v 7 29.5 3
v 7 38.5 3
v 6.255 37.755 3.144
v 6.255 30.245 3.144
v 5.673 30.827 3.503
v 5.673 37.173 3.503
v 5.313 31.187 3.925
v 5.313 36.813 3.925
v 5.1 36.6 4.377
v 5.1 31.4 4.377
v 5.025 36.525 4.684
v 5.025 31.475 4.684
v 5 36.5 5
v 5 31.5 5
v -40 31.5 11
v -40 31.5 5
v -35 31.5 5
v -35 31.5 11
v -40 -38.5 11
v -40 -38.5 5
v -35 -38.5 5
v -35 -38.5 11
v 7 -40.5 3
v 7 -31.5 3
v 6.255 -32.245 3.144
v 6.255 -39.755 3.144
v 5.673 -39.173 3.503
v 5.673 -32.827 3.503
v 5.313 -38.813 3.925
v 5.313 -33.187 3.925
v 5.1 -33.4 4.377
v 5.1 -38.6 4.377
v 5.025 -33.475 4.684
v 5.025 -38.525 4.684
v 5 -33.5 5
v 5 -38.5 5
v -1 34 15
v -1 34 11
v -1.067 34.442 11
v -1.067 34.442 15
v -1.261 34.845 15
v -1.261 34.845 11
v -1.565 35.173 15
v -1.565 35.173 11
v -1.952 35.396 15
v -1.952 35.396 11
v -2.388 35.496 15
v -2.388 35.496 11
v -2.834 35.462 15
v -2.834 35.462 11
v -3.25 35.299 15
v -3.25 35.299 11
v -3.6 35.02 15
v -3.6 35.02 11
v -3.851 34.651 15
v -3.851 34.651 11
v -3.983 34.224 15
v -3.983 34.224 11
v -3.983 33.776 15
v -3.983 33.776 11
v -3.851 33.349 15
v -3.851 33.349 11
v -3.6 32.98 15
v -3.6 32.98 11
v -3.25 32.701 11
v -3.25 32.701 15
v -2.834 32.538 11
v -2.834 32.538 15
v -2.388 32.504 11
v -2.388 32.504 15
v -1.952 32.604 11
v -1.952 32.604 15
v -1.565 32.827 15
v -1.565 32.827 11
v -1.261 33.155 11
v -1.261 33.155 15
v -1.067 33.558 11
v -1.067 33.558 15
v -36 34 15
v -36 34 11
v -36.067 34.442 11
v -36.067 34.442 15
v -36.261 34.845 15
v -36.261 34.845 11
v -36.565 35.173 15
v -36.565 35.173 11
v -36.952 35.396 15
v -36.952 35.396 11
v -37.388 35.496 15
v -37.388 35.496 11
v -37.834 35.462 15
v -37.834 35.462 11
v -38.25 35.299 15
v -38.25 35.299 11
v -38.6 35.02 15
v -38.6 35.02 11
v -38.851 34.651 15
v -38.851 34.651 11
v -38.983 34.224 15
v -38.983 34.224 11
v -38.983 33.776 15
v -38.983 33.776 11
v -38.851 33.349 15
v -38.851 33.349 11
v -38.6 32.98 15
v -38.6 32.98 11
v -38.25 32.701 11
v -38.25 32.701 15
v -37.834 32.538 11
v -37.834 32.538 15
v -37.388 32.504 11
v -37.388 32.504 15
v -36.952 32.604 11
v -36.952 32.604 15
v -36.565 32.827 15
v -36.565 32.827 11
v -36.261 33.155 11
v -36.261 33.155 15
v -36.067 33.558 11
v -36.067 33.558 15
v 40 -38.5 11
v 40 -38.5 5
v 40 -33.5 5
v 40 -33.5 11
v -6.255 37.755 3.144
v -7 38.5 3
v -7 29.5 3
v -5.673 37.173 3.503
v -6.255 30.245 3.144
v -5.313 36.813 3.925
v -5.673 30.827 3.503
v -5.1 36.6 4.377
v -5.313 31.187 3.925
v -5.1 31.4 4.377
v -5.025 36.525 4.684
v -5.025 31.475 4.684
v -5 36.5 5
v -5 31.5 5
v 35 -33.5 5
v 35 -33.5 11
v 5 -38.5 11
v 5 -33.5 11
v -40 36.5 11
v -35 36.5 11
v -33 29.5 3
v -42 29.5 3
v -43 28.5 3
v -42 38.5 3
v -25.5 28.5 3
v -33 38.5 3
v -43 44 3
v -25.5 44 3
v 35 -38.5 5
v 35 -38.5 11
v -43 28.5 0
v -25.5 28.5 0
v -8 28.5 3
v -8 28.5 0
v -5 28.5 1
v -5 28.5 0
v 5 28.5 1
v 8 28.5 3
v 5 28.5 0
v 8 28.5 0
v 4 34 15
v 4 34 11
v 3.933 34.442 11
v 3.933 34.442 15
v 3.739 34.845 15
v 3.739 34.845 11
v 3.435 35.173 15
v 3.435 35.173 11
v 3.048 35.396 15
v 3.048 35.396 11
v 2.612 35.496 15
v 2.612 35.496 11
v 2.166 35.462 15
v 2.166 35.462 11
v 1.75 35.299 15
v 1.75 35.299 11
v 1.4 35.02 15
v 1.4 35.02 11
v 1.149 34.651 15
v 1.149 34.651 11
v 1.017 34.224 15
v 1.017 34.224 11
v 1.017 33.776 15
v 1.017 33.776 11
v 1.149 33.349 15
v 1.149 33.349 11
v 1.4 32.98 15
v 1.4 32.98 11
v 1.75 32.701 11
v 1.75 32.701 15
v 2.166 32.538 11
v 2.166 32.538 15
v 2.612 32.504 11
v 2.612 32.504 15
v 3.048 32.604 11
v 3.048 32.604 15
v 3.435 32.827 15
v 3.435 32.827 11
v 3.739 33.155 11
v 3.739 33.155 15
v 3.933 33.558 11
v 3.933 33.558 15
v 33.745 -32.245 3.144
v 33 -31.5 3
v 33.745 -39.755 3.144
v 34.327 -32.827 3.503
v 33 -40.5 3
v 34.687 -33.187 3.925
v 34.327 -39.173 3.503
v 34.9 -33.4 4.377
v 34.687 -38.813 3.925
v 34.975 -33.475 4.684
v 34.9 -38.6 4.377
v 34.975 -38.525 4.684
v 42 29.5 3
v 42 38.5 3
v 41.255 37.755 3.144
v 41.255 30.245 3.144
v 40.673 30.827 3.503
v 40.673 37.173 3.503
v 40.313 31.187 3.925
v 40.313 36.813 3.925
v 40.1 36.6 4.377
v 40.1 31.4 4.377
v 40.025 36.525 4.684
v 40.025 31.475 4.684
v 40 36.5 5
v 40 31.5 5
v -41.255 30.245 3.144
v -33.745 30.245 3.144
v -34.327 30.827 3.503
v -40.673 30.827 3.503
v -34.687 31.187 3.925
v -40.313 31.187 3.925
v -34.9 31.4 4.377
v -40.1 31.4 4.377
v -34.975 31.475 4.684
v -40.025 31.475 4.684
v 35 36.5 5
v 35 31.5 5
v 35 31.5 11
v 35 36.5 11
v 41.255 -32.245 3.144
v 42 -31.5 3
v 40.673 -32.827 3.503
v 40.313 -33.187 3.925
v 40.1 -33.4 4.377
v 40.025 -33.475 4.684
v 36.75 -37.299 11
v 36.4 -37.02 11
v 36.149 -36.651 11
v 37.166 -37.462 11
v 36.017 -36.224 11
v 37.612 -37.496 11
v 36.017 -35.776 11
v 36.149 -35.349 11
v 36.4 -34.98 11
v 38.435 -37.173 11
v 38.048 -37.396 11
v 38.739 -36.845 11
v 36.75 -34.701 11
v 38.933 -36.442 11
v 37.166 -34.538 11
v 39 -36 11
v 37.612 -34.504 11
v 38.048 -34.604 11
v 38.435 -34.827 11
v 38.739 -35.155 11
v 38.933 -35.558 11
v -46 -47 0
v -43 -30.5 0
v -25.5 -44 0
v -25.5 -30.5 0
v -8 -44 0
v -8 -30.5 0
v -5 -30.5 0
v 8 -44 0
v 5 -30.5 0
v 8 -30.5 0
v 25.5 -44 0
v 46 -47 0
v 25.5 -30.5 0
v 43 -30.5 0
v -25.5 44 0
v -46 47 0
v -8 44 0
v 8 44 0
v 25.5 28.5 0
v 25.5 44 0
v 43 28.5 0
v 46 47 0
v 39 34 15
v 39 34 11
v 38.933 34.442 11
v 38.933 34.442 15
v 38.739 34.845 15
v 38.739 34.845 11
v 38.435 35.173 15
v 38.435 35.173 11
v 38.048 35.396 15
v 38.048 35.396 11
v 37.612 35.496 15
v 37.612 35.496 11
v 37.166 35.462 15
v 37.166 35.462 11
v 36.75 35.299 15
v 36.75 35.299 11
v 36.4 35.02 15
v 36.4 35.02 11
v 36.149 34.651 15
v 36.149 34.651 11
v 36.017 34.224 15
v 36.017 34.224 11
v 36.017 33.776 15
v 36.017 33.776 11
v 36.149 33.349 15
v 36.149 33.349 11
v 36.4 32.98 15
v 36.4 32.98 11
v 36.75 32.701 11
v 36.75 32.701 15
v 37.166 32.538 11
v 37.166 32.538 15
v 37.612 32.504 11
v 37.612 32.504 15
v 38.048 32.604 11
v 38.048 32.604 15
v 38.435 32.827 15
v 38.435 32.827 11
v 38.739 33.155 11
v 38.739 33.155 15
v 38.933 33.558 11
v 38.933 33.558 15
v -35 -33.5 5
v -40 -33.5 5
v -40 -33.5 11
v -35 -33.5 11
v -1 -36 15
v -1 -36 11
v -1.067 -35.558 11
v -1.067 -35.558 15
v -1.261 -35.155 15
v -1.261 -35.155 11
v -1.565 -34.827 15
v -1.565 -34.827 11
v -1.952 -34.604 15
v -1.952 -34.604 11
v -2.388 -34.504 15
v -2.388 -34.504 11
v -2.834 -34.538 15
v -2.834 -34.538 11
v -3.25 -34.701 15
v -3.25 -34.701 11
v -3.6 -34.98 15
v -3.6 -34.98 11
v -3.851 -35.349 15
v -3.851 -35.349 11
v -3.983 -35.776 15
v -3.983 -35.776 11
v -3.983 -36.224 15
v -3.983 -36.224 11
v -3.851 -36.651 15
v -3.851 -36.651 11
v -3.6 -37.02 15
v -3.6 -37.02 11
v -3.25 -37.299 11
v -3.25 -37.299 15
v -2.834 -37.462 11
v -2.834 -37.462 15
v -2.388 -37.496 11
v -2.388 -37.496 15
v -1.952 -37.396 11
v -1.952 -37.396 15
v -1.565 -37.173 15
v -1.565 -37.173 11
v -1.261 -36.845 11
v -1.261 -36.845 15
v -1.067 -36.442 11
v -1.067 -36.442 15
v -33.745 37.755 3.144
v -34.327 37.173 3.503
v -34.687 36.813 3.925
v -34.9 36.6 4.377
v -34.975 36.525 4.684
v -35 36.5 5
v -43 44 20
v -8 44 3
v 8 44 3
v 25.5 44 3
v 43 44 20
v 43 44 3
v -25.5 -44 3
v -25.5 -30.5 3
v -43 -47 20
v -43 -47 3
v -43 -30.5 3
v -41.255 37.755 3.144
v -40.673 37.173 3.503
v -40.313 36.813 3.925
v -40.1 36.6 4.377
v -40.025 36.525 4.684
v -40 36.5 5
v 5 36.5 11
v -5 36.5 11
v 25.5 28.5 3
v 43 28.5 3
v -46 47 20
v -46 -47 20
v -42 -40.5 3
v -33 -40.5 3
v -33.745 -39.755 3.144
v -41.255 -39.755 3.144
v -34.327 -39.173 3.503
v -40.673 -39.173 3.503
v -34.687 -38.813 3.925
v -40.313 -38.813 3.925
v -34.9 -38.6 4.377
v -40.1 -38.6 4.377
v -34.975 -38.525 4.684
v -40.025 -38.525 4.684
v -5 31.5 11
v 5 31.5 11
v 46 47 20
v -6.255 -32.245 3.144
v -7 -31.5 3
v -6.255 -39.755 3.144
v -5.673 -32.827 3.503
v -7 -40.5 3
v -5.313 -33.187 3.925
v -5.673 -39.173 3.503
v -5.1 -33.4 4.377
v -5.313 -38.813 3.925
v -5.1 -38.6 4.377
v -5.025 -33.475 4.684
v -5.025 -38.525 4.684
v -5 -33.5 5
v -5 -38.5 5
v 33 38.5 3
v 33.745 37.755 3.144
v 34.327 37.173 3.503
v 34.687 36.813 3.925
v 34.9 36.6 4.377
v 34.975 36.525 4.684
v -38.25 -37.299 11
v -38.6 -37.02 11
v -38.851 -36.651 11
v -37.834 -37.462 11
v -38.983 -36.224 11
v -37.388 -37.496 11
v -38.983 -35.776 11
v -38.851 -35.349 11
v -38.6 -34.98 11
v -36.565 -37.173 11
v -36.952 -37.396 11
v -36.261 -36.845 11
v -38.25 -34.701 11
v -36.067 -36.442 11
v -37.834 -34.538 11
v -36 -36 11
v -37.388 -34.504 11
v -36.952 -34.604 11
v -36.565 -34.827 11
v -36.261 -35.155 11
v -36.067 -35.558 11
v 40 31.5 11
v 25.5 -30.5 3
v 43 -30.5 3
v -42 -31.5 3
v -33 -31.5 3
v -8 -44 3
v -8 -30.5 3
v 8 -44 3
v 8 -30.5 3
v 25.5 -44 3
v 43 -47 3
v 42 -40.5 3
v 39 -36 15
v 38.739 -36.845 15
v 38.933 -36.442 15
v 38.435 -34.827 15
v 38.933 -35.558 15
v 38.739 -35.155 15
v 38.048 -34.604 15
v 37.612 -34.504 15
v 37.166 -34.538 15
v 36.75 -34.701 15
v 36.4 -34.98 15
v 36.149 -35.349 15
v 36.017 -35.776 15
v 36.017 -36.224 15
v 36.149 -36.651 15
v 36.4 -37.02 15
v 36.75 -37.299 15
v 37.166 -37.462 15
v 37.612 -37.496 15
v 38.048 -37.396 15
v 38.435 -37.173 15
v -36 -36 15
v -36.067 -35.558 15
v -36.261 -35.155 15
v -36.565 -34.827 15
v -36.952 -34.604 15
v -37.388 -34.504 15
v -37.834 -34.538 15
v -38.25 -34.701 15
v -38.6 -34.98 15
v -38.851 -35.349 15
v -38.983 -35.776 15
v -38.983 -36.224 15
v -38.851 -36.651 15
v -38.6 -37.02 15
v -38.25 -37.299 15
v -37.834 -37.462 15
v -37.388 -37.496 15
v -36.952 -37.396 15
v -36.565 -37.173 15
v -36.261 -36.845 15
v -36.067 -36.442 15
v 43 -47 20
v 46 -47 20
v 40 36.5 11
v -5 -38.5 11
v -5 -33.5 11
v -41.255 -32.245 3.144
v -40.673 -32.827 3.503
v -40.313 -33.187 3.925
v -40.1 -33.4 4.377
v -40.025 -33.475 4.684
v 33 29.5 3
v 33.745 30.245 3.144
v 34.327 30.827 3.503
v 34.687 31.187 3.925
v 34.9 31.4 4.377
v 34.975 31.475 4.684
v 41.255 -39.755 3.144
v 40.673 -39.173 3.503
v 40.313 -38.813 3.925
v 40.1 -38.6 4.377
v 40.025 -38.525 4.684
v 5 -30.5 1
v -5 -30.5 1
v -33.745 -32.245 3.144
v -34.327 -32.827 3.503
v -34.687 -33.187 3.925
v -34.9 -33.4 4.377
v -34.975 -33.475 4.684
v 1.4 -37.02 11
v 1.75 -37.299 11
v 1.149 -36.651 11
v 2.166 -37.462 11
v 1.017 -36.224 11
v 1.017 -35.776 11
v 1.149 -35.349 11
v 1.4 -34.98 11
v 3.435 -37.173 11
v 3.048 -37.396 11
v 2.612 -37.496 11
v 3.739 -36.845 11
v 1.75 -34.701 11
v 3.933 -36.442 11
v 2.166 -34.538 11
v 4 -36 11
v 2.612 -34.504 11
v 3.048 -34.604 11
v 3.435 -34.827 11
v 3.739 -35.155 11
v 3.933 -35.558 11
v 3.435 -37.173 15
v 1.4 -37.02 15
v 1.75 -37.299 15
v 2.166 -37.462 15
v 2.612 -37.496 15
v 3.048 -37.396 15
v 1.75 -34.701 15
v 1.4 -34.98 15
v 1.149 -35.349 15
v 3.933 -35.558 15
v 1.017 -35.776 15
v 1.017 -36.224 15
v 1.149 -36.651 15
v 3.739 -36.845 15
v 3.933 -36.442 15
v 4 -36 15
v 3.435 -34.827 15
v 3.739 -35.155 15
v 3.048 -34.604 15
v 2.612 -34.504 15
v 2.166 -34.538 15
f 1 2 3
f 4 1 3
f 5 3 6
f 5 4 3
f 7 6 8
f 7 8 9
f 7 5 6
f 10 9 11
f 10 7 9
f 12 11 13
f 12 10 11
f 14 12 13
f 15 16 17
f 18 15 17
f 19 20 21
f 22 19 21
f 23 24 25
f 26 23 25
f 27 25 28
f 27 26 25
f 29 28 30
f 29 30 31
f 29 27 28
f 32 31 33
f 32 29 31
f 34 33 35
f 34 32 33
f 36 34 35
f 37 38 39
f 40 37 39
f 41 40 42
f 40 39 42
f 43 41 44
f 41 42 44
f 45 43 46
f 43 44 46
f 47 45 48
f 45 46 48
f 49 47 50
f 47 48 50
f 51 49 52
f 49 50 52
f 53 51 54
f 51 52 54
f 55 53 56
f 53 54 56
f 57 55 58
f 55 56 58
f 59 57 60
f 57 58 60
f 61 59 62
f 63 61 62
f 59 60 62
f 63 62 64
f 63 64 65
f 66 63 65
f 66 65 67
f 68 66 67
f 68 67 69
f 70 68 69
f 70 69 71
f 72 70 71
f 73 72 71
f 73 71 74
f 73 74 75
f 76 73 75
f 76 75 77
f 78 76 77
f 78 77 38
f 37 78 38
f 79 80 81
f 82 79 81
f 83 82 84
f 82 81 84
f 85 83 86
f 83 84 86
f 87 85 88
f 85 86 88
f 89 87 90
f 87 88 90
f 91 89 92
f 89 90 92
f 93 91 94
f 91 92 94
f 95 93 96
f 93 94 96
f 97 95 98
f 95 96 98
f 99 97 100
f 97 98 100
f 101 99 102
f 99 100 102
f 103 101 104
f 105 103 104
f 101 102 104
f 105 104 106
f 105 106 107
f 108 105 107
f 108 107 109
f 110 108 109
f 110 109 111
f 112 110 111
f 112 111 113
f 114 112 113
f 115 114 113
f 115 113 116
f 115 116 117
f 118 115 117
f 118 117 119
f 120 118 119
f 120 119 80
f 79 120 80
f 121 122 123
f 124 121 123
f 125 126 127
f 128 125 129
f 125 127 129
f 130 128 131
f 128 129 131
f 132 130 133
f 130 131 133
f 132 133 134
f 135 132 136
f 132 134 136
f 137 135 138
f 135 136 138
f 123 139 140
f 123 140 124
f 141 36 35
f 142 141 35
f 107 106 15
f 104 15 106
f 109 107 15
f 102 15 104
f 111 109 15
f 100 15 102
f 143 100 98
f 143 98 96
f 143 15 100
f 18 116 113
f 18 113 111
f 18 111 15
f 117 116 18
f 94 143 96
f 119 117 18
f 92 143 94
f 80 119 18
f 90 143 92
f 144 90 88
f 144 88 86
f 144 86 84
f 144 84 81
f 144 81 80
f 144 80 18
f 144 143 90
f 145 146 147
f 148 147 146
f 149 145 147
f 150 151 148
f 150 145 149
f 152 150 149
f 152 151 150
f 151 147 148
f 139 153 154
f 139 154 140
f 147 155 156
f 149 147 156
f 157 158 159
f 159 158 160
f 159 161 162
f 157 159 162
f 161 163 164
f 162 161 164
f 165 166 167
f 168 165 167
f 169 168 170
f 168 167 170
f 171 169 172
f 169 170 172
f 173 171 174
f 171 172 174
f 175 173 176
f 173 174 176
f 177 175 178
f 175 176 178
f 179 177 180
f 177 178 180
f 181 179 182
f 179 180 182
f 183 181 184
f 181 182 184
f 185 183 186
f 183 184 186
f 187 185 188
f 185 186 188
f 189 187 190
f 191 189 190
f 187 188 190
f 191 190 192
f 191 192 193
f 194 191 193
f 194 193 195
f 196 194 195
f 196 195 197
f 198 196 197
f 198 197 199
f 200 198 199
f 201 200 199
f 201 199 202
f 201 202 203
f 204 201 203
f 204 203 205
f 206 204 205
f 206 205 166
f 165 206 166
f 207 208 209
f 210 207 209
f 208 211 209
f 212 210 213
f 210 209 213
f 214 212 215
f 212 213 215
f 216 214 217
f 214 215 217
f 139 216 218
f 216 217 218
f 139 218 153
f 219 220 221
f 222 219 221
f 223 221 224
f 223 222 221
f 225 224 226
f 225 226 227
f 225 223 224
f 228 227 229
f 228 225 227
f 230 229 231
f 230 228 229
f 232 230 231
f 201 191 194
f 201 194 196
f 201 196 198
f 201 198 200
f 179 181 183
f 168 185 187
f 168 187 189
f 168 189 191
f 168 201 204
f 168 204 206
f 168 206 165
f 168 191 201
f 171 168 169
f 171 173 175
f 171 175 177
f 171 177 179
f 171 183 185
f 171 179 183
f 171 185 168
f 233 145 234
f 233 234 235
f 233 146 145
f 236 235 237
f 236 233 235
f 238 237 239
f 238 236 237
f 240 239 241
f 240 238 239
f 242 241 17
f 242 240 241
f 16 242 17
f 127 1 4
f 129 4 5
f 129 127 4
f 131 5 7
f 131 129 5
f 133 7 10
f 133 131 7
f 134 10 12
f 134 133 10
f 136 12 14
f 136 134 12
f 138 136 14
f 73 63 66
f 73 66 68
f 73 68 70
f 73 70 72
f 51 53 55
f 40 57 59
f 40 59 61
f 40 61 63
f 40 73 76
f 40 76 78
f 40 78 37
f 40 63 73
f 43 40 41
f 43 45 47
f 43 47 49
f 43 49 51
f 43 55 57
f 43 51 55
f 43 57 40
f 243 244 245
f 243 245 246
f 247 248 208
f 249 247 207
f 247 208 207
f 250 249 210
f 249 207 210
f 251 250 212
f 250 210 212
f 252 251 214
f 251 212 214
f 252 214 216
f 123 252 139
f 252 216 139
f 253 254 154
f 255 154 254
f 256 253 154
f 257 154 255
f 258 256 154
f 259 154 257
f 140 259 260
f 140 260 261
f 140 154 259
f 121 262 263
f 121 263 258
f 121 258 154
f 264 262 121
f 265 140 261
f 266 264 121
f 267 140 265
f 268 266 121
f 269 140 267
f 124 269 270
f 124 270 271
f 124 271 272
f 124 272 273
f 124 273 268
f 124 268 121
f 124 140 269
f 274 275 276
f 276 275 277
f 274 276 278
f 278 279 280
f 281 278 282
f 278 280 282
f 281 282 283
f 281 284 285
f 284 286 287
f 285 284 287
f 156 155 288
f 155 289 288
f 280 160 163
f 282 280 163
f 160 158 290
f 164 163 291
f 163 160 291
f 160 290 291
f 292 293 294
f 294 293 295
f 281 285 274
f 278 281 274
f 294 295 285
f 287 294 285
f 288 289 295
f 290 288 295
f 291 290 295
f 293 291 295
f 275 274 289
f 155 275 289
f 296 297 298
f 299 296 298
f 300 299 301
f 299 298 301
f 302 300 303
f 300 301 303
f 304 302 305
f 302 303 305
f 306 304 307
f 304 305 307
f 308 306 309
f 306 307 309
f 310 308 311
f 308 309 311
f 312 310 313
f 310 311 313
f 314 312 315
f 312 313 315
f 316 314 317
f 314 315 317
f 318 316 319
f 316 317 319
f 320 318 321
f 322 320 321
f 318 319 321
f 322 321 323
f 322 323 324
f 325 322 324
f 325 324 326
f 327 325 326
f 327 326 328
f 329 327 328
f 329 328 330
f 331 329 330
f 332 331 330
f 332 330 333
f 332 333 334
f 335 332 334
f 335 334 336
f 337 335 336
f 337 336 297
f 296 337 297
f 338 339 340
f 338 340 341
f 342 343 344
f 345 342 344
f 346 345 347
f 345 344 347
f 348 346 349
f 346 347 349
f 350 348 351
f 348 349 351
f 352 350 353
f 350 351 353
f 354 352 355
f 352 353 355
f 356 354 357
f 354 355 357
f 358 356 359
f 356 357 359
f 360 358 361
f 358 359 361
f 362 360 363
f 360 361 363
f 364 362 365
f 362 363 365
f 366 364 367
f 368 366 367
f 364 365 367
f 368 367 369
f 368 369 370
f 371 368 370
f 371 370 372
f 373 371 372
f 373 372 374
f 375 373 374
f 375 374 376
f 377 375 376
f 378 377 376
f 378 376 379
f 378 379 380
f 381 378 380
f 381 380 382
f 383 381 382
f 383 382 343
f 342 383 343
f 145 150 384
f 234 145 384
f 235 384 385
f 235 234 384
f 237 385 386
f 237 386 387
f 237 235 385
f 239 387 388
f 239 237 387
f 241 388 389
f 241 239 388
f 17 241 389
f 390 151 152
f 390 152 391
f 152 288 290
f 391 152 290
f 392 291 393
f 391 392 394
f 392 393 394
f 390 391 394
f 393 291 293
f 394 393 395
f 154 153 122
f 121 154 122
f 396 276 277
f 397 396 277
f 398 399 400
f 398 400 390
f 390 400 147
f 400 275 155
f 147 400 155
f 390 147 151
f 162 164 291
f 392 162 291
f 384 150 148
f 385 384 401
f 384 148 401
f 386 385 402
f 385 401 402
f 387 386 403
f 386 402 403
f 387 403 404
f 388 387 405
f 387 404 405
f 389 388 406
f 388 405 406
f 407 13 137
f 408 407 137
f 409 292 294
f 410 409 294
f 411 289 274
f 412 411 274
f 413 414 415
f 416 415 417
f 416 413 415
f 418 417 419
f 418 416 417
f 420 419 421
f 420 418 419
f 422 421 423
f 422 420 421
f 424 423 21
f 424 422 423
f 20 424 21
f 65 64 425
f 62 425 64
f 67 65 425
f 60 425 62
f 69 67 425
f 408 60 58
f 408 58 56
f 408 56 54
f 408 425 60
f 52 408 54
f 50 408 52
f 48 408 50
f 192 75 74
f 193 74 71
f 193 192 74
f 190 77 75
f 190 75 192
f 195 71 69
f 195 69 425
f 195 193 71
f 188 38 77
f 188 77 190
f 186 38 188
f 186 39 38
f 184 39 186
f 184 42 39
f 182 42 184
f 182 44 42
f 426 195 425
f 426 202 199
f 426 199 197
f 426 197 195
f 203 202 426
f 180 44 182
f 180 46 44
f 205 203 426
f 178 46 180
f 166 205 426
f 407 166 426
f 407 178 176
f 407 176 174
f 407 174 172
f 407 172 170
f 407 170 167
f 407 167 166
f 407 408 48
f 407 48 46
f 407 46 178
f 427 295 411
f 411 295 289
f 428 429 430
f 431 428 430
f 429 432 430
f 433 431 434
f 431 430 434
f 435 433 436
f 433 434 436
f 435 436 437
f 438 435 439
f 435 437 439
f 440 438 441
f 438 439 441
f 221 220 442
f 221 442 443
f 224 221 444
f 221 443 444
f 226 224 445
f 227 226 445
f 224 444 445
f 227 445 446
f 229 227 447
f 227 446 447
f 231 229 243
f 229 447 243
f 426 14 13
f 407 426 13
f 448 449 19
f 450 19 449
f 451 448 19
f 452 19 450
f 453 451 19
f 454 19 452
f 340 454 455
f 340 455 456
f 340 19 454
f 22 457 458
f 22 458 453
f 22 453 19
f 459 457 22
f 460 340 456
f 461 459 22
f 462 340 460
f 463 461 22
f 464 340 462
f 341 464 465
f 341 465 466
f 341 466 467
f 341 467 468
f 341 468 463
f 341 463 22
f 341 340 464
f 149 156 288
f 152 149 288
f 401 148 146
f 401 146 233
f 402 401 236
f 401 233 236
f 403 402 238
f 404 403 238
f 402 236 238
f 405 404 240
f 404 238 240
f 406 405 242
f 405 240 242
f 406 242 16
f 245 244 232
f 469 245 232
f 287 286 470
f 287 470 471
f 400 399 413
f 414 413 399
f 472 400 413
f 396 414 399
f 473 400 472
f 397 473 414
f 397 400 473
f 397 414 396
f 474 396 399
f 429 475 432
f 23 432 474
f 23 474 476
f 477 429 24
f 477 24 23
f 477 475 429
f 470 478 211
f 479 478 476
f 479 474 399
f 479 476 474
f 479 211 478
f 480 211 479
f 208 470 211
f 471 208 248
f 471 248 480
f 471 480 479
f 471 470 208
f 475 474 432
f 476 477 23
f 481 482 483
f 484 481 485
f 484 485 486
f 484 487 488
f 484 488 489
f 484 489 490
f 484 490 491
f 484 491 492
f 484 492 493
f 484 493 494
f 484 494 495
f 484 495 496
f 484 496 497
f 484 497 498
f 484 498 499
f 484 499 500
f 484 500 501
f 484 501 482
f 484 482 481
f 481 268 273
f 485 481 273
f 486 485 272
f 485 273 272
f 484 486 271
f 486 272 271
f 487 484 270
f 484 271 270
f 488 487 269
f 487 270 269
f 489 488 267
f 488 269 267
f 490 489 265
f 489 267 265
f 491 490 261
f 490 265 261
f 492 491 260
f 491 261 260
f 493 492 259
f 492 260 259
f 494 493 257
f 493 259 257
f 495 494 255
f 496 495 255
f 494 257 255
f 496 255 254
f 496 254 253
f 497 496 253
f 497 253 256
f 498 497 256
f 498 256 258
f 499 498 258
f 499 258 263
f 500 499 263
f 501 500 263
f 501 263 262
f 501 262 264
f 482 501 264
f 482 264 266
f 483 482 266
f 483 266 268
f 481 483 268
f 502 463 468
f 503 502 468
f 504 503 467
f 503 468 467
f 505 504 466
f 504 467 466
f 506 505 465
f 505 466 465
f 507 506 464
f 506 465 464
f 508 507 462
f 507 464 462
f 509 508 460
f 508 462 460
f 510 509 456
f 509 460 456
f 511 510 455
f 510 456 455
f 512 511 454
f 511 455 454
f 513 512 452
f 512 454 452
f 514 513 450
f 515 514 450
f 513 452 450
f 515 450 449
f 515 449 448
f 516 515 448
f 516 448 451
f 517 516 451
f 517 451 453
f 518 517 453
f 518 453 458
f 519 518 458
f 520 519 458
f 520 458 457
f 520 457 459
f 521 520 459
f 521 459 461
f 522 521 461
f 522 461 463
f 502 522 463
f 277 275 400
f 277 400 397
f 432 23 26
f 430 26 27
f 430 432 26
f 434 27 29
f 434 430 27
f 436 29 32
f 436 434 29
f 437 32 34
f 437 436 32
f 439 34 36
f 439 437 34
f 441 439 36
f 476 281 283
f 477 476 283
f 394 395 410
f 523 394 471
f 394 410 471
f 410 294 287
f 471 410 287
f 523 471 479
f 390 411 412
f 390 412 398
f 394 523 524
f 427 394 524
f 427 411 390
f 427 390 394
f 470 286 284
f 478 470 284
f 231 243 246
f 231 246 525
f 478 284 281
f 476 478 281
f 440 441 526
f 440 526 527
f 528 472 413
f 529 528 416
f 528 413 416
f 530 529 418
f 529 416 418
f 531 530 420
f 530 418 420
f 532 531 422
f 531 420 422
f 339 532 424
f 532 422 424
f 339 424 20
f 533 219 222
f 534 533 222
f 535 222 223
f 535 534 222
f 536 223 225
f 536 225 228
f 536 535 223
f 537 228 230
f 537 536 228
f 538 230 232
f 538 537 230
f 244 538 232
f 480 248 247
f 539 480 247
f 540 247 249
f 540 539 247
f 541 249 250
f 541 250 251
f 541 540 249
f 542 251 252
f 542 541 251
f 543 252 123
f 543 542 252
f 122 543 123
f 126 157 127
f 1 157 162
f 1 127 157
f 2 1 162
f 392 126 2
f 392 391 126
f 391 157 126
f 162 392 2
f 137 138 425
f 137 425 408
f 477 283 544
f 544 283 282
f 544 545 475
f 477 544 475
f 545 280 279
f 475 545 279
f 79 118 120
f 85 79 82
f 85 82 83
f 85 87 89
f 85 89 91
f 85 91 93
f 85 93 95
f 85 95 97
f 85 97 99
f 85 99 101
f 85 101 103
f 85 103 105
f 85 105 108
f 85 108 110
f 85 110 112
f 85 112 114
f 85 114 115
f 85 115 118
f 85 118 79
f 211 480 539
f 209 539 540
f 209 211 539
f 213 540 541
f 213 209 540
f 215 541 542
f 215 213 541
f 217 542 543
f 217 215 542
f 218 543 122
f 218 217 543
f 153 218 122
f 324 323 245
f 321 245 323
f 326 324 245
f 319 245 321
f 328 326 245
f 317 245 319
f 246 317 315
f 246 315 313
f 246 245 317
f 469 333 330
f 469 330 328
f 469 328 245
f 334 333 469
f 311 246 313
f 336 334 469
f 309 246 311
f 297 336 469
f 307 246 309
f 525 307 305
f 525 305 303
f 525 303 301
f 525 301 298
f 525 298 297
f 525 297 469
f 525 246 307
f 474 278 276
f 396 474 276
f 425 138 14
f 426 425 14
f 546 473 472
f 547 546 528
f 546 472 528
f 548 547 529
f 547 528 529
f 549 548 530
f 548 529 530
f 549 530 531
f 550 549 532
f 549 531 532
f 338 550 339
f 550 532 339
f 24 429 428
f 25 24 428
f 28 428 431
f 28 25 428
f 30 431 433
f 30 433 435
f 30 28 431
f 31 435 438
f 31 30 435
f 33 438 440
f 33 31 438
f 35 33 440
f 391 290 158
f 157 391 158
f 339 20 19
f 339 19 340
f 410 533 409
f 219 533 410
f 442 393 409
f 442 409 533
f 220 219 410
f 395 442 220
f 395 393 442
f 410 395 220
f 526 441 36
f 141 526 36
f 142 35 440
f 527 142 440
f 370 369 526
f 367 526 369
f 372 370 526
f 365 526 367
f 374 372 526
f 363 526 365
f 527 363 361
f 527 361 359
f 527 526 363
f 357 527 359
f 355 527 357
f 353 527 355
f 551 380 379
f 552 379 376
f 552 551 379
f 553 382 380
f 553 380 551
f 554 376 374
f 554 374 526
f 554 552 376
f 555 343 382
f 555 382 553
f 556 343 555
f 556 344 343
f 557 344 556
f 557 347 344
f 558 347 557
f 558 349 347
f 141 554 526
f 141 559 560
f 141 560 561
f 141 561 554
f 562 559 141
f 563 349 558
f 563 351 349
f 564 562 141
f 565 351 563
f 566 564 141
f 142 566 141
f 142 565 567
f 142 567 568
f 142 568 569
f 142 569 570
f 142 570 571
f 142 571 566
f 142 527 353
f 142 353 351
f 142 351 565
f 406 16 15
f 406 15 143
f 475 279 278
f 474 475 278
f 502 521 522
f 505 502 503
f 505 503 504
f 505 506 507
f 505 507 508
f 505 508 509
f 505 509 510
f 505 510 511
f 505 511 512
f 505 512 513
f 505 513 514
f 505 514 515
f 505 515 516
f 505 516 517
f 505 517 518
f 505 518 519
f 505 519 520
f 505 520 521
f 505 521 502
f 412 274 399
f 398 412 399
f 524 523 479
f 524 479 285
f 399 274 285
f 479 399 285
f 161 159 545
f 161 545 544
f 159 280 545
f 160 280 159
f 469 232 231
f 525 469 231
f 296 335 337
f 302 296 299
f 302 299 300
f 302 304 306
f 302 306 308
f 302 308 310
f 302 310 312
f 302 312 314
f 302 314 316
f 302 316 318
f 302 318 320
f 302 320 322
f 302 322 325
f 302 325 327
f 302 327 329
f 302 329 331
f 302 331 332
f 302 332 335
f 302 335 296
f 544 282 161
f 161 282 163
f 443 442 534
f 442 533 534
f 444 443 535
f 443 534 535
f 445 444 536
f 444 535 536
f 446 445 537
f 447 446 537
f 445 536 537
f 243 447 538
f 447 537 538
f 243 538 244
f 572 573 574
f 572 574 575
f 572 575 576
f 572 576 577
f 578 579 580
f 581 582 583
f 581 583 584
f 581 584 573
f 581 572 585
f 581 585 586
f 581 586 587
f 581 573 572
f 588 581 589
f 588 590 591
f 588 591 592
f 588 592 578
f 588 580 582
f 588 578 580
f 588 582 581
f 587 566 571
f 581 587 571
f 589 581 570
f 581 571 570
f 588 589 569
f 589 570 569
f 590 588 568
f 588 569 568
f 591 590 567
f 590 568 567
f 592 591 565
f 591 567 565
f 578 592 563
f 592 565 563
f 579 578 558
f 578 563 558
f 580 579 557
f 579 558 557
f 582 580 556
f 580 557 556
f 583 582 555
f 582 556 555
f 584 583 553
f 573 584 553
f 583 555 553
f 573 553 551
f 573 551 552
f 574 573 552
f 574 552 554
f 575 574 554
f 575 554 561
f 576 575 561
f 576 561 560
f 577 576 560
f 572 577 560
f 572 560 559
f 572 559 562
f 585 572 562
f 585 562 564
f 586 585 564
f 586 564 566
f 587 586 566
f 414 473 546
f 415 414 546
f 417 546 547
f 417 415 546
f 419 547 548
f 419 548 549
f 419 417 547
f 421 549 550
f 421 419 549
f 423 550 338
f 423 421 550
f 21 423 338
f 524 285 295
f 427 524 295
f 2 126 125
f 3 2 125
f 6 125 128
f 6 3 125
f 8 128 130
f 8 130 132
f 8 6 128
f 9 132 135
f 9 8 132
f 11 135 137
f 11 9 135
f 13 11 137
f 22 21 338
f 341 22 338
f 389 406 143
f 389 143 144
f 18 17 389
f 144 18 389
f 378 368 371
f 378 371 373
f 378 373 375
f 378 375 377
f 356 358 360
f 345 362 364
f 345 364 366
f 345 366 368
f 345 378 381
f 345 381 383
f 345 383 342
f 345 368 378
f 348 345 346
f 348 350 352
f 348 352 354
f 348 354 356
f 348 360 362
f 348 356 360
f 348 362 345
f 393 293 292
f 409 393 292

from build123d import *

# Parameters (mm, degrees)
F1_W     = 3
F1_H     = 5.5
F1_H_2   = 7.5
F1_H_3   = 5
F1_H_4   = 3
F1_W_2   = 17.5
F1_W_3   = 10
F2_DEPTH = 3
F3_DEPTH = 20
F0_W     = 5
F0_H     = 5
F0_R     = 1.5
F4_DEPTH = 11
F5_DEPTH = 15
F6_R     = 2
F1_H_5   = 59
F7_DEPTH = 1


with BuildPart() as f2:
    # F1 (on Top) → F2 (new body)
    with BuildSketch(Plane.XY):
        with Locations((-6.5, -41.25)):
            Rectangle(F1_W, F1_H)
        with Locations((-6.5, 40.25)):
            Rectangle(F1_W, F1_H_2)
        with Locations((-6.5, 34)):
            Rectangle(F1_W, F1_H_3)
        with Locations((-6.5, 30)):
            Rectangle(F1_W, F1_H_4)
        with Locations((-6.5, -36)):
            Rectangle(F1_W, F1_H_3)
        with Locations((-6.5, -32)):
            Rectangle(F1_W, F1_H_4)
        Polygon((43, -47), (43, -44), (25.5, -44), (8, -44), (5, -44), (-5, -44), (-8, -44), (-25.5, -44), (-43, -44), (-43, -47), align=None)
        Polygon((43, -38.5), (43, -44), (43, -47), (46, -47), (46, 47), (-46, 47), (-46, -47), (-43, -47), (-43, -44), (-43, -38.5), (-43, -33.5), (-43, -30.5), (-43, 28.5), (-43, 31.5), (-43, 36.5), (-43, 44), (-25.5, 44), (-8, 44), (-5, 44), (5, 44), (8, 44), (25.5, 44), (43, 44), (43, 36.5), (43, 31.5), (43, 28.5), (43, -30.5), (43, -33.5), align=None)
        with Locations((-34.25, 40.25)):
            Rectangle(F1_W_2, F1_H_2)
        with Locations((0, 40.25)):
            Rectangle(F1_W_3, F1_H_2)
        with Locations((6.5, 40.25)):
            Rectangle(F1_W, F1_H_2)
        with Locations((34.25, 40.25)):
            Rectangle(F1_W_2, F1_H_2)
        with Locations((34.25, 34)):
            Rectangle(F1_W_2, F1_H_3)
        with Locations((6.5, 34)):
            Rectangle(F1_W, F1_H_3)
        with Locations((-34.25, 34)):
            Rectangle(F1_W_2, F1_H_3)
        with Locations((0, 34)):
            Rectangle(F1_W_3, F1_H_3)
        with Locations((-34.25, 30)):
            Rectangle(F1_W_2, F1_H_4)
        with Locations((6.5, 30)):
            Rectangle(F1_W, F1_H_4)
        with Locations((34.25, 30)):
            Rectangle(F1_W_2, F1_H_4)
        with Locations((0, 30)):
            Rectangle(F1_W_3, F1_H_4)
        with Locations((0, -41.25)):
            Rectangle(F1_W_3, F1_H)
        with Locations((0, -36)):
            Rectangle(F1_W_3, F1_H_3)
        with Locations((0, -32)):
            Rectangle(F1_W_3, F1_H_4)
        with Locations((6.5, -41.25)):
            Rectangle(F1_W, F1_H)
        with Locations((6.5, -36)):
            Rectangle(F1_W, F1_H_3)
        with Locations((6.5, -32)):
            Rectangle(F1_W, F1_H_4)
        with Locations((-34.25, -32)):
            Rectangle(F1_W_2, F1_H_4)
        with Locations((34.25, -32)):
            Rectangle(F1_W_2, F1_H_4)
        with Locations((34.25, -36)):
            Rectangle(F1_W_2, F1_H_3)
        with Locations((-34.25, -36)):
            Rectangle(F1_W_2, F1_H_3)
        with Locations((-34.25, -41.25)):
            Rectangle(F1_W_2, F1_H)
        with Locations((34.25, -41.25)):
            Rectangle(F1_W_2, F1_H)
    extrude(amount=F2_DEPTH)

    # F1 (on Top) → F3 (join)
    with BuildSketch(Plane.XY):
        Polygon((43, -38.5), (43, -44), (43, -47), (46, -47), (46, 47), (-46, 47), (-46, -47), (-43, -47), (-43, -44), (-43, -38.5), (-43, -33.5), (-43, -30.5), (-43, 28.5), (-43, 31.5), (-43, 36.5), (-43, 44), (-25.5, 44), (-8, 44), (-5, 44), (5, 44), (8, 44), (25.5, 44), (43, 44), (43, 36.5), (43, 31.5), (43, 28.5), (43, -30.5), (43, -33.5), align=None)
    extrude(amount=F3_DEPTH)

    # F0 (on Top) → F4 (join)
    with BuildSketch(Plane.XY):
        with Locations((37.5, 34)):
            Rectangle(F0_W, F0_H)
        with Locations((37.5, 34)):
            Circle(F0_R, mode=Mode.SUBTRACT)
        with Locations((2.5, 34)):
            Rectangle(F0_W, F0_H)
        with Locations((2.5, 34)):
            Circle(F0_R, mode=Mode.SUBTRACT)
        with Locations((-2.5, 34)):
            Rectangle(F0_W, F0_H)
        with Locations((-2.5, 34)):
            Circle(F0_R, mode=Mode.SUBTRACT)
        with Locations((-37.5, 34)):
            Rectangle(F0_W, F0_H)
        with Locations((-37.5, 34)):
            Circle(F0_R, mode=Mode.SUBTRACT)
        with Locations((37.5, -36)):
            Rectangle(F0_W, F0_H)
        with Locations((37.5, -36)):
            Circle(F0_R, mode=Mode.SUBTRACT)
        with Locations((-2.5, -36)):
            Rectangle(F0_W, F0_H)
        with Locations((-2.5, -36)):
            Circle(F0_R, mode=Mode.SUBTRACT)
        with Locations((2.5, -36)):
            Rectangle(F0_W, F0_H)
        with Locations((2.5, -36)):
            Circle(F0_R, mode=Mode.SUBTRACT)
        with Locations((-37.5, -36)):
            Rectangle(F0_W, F0_H)
        with Locations((-37.5, -36)):
            Circle(F0_R, mode=Mode.SUBTRACT)
        with Locations((37.5, 34)):
            Circle(F0_R)
        with Locations((2.5, 34)):
            Circle(F0_R)
        with Locations((-2.5, 34)):
            Circle(F0_R)
        with Locations((-37.5, 34)):
            Circle(F0_R)
        with Locations((37.5, -36)):
            Circle(F0_R)
        with Locations((-2.5, -36)):
            Circle(F0_R)
        with Locations((2.5, -36)):
            Circle(F0_R)
        with Locations((-37.5, -36)):
            Circle(F0_R)
    extrude(amount=F4_DEPTH)

    # F0 (on Top) → F5 (join)
    with BuildSketch(Plane.XY):
        with Locations((37.5, -36)):
            Circle(F0_R)
        with Locations((2.5, -36)):
            Circle(F0_R)
        with Locations((-2.5, -36)):
            Circle(F0_R)
        with Locations((-37.5, -36)):
            Circle(F0_R)
        with Locations((-37.5, 34)):
            Circle(F0_R)
        with Locations((-2.5, 34)):
            Circle(F0_R)
        with Locations((2.5, 34)):
            Circle(F0_R)
        with Locations((37.5, 34)):
            Circle(F0_R)
    extrude(amount=F5_DEPTH)

    # F6
    f6_edges = [f2.edges().sort_by_distance(p)[0] for p in [
        (-37.5, -38.5, 3),
        (-35, -36, 3),
        (-37.5, -33.5, 3),
        (-40, -36, 3),
        (0, -38.5, 3),
        (-37.5, 31.5, 3),
        (0, 31.5, 3),
        (37.5, -38.5, 3),
        (5, -36, 3),
        (5, 34, 3),
        (-35, 34, 3),
        (-5, 34, 3),
        (-5, -36, 3),
        (35, 34, 3),
        (37.5, 31.5, 3),
        (35, -36, 3),
        (0, -33.5, 3),
        (40, -36, 3),
        (37.5, -33.5, 3),
        (-37.5, 36.5, 3),
        (-40, 34, 3),
        (0, 36.5, 3),
        (37.5, 36.5, 3),
        (40, 34, 3),
    ]]
    fillet(f6_edges, radius=F6_R)

    # F1 (on Top) → F7 (join)
    with BuildSketch(Plane.XY):
        with Locations((0, -1)):
            Rectangle(F1_W_3, F1_H_5)
    extrude(amount=F7_DEPTH)


solid = f2.part
